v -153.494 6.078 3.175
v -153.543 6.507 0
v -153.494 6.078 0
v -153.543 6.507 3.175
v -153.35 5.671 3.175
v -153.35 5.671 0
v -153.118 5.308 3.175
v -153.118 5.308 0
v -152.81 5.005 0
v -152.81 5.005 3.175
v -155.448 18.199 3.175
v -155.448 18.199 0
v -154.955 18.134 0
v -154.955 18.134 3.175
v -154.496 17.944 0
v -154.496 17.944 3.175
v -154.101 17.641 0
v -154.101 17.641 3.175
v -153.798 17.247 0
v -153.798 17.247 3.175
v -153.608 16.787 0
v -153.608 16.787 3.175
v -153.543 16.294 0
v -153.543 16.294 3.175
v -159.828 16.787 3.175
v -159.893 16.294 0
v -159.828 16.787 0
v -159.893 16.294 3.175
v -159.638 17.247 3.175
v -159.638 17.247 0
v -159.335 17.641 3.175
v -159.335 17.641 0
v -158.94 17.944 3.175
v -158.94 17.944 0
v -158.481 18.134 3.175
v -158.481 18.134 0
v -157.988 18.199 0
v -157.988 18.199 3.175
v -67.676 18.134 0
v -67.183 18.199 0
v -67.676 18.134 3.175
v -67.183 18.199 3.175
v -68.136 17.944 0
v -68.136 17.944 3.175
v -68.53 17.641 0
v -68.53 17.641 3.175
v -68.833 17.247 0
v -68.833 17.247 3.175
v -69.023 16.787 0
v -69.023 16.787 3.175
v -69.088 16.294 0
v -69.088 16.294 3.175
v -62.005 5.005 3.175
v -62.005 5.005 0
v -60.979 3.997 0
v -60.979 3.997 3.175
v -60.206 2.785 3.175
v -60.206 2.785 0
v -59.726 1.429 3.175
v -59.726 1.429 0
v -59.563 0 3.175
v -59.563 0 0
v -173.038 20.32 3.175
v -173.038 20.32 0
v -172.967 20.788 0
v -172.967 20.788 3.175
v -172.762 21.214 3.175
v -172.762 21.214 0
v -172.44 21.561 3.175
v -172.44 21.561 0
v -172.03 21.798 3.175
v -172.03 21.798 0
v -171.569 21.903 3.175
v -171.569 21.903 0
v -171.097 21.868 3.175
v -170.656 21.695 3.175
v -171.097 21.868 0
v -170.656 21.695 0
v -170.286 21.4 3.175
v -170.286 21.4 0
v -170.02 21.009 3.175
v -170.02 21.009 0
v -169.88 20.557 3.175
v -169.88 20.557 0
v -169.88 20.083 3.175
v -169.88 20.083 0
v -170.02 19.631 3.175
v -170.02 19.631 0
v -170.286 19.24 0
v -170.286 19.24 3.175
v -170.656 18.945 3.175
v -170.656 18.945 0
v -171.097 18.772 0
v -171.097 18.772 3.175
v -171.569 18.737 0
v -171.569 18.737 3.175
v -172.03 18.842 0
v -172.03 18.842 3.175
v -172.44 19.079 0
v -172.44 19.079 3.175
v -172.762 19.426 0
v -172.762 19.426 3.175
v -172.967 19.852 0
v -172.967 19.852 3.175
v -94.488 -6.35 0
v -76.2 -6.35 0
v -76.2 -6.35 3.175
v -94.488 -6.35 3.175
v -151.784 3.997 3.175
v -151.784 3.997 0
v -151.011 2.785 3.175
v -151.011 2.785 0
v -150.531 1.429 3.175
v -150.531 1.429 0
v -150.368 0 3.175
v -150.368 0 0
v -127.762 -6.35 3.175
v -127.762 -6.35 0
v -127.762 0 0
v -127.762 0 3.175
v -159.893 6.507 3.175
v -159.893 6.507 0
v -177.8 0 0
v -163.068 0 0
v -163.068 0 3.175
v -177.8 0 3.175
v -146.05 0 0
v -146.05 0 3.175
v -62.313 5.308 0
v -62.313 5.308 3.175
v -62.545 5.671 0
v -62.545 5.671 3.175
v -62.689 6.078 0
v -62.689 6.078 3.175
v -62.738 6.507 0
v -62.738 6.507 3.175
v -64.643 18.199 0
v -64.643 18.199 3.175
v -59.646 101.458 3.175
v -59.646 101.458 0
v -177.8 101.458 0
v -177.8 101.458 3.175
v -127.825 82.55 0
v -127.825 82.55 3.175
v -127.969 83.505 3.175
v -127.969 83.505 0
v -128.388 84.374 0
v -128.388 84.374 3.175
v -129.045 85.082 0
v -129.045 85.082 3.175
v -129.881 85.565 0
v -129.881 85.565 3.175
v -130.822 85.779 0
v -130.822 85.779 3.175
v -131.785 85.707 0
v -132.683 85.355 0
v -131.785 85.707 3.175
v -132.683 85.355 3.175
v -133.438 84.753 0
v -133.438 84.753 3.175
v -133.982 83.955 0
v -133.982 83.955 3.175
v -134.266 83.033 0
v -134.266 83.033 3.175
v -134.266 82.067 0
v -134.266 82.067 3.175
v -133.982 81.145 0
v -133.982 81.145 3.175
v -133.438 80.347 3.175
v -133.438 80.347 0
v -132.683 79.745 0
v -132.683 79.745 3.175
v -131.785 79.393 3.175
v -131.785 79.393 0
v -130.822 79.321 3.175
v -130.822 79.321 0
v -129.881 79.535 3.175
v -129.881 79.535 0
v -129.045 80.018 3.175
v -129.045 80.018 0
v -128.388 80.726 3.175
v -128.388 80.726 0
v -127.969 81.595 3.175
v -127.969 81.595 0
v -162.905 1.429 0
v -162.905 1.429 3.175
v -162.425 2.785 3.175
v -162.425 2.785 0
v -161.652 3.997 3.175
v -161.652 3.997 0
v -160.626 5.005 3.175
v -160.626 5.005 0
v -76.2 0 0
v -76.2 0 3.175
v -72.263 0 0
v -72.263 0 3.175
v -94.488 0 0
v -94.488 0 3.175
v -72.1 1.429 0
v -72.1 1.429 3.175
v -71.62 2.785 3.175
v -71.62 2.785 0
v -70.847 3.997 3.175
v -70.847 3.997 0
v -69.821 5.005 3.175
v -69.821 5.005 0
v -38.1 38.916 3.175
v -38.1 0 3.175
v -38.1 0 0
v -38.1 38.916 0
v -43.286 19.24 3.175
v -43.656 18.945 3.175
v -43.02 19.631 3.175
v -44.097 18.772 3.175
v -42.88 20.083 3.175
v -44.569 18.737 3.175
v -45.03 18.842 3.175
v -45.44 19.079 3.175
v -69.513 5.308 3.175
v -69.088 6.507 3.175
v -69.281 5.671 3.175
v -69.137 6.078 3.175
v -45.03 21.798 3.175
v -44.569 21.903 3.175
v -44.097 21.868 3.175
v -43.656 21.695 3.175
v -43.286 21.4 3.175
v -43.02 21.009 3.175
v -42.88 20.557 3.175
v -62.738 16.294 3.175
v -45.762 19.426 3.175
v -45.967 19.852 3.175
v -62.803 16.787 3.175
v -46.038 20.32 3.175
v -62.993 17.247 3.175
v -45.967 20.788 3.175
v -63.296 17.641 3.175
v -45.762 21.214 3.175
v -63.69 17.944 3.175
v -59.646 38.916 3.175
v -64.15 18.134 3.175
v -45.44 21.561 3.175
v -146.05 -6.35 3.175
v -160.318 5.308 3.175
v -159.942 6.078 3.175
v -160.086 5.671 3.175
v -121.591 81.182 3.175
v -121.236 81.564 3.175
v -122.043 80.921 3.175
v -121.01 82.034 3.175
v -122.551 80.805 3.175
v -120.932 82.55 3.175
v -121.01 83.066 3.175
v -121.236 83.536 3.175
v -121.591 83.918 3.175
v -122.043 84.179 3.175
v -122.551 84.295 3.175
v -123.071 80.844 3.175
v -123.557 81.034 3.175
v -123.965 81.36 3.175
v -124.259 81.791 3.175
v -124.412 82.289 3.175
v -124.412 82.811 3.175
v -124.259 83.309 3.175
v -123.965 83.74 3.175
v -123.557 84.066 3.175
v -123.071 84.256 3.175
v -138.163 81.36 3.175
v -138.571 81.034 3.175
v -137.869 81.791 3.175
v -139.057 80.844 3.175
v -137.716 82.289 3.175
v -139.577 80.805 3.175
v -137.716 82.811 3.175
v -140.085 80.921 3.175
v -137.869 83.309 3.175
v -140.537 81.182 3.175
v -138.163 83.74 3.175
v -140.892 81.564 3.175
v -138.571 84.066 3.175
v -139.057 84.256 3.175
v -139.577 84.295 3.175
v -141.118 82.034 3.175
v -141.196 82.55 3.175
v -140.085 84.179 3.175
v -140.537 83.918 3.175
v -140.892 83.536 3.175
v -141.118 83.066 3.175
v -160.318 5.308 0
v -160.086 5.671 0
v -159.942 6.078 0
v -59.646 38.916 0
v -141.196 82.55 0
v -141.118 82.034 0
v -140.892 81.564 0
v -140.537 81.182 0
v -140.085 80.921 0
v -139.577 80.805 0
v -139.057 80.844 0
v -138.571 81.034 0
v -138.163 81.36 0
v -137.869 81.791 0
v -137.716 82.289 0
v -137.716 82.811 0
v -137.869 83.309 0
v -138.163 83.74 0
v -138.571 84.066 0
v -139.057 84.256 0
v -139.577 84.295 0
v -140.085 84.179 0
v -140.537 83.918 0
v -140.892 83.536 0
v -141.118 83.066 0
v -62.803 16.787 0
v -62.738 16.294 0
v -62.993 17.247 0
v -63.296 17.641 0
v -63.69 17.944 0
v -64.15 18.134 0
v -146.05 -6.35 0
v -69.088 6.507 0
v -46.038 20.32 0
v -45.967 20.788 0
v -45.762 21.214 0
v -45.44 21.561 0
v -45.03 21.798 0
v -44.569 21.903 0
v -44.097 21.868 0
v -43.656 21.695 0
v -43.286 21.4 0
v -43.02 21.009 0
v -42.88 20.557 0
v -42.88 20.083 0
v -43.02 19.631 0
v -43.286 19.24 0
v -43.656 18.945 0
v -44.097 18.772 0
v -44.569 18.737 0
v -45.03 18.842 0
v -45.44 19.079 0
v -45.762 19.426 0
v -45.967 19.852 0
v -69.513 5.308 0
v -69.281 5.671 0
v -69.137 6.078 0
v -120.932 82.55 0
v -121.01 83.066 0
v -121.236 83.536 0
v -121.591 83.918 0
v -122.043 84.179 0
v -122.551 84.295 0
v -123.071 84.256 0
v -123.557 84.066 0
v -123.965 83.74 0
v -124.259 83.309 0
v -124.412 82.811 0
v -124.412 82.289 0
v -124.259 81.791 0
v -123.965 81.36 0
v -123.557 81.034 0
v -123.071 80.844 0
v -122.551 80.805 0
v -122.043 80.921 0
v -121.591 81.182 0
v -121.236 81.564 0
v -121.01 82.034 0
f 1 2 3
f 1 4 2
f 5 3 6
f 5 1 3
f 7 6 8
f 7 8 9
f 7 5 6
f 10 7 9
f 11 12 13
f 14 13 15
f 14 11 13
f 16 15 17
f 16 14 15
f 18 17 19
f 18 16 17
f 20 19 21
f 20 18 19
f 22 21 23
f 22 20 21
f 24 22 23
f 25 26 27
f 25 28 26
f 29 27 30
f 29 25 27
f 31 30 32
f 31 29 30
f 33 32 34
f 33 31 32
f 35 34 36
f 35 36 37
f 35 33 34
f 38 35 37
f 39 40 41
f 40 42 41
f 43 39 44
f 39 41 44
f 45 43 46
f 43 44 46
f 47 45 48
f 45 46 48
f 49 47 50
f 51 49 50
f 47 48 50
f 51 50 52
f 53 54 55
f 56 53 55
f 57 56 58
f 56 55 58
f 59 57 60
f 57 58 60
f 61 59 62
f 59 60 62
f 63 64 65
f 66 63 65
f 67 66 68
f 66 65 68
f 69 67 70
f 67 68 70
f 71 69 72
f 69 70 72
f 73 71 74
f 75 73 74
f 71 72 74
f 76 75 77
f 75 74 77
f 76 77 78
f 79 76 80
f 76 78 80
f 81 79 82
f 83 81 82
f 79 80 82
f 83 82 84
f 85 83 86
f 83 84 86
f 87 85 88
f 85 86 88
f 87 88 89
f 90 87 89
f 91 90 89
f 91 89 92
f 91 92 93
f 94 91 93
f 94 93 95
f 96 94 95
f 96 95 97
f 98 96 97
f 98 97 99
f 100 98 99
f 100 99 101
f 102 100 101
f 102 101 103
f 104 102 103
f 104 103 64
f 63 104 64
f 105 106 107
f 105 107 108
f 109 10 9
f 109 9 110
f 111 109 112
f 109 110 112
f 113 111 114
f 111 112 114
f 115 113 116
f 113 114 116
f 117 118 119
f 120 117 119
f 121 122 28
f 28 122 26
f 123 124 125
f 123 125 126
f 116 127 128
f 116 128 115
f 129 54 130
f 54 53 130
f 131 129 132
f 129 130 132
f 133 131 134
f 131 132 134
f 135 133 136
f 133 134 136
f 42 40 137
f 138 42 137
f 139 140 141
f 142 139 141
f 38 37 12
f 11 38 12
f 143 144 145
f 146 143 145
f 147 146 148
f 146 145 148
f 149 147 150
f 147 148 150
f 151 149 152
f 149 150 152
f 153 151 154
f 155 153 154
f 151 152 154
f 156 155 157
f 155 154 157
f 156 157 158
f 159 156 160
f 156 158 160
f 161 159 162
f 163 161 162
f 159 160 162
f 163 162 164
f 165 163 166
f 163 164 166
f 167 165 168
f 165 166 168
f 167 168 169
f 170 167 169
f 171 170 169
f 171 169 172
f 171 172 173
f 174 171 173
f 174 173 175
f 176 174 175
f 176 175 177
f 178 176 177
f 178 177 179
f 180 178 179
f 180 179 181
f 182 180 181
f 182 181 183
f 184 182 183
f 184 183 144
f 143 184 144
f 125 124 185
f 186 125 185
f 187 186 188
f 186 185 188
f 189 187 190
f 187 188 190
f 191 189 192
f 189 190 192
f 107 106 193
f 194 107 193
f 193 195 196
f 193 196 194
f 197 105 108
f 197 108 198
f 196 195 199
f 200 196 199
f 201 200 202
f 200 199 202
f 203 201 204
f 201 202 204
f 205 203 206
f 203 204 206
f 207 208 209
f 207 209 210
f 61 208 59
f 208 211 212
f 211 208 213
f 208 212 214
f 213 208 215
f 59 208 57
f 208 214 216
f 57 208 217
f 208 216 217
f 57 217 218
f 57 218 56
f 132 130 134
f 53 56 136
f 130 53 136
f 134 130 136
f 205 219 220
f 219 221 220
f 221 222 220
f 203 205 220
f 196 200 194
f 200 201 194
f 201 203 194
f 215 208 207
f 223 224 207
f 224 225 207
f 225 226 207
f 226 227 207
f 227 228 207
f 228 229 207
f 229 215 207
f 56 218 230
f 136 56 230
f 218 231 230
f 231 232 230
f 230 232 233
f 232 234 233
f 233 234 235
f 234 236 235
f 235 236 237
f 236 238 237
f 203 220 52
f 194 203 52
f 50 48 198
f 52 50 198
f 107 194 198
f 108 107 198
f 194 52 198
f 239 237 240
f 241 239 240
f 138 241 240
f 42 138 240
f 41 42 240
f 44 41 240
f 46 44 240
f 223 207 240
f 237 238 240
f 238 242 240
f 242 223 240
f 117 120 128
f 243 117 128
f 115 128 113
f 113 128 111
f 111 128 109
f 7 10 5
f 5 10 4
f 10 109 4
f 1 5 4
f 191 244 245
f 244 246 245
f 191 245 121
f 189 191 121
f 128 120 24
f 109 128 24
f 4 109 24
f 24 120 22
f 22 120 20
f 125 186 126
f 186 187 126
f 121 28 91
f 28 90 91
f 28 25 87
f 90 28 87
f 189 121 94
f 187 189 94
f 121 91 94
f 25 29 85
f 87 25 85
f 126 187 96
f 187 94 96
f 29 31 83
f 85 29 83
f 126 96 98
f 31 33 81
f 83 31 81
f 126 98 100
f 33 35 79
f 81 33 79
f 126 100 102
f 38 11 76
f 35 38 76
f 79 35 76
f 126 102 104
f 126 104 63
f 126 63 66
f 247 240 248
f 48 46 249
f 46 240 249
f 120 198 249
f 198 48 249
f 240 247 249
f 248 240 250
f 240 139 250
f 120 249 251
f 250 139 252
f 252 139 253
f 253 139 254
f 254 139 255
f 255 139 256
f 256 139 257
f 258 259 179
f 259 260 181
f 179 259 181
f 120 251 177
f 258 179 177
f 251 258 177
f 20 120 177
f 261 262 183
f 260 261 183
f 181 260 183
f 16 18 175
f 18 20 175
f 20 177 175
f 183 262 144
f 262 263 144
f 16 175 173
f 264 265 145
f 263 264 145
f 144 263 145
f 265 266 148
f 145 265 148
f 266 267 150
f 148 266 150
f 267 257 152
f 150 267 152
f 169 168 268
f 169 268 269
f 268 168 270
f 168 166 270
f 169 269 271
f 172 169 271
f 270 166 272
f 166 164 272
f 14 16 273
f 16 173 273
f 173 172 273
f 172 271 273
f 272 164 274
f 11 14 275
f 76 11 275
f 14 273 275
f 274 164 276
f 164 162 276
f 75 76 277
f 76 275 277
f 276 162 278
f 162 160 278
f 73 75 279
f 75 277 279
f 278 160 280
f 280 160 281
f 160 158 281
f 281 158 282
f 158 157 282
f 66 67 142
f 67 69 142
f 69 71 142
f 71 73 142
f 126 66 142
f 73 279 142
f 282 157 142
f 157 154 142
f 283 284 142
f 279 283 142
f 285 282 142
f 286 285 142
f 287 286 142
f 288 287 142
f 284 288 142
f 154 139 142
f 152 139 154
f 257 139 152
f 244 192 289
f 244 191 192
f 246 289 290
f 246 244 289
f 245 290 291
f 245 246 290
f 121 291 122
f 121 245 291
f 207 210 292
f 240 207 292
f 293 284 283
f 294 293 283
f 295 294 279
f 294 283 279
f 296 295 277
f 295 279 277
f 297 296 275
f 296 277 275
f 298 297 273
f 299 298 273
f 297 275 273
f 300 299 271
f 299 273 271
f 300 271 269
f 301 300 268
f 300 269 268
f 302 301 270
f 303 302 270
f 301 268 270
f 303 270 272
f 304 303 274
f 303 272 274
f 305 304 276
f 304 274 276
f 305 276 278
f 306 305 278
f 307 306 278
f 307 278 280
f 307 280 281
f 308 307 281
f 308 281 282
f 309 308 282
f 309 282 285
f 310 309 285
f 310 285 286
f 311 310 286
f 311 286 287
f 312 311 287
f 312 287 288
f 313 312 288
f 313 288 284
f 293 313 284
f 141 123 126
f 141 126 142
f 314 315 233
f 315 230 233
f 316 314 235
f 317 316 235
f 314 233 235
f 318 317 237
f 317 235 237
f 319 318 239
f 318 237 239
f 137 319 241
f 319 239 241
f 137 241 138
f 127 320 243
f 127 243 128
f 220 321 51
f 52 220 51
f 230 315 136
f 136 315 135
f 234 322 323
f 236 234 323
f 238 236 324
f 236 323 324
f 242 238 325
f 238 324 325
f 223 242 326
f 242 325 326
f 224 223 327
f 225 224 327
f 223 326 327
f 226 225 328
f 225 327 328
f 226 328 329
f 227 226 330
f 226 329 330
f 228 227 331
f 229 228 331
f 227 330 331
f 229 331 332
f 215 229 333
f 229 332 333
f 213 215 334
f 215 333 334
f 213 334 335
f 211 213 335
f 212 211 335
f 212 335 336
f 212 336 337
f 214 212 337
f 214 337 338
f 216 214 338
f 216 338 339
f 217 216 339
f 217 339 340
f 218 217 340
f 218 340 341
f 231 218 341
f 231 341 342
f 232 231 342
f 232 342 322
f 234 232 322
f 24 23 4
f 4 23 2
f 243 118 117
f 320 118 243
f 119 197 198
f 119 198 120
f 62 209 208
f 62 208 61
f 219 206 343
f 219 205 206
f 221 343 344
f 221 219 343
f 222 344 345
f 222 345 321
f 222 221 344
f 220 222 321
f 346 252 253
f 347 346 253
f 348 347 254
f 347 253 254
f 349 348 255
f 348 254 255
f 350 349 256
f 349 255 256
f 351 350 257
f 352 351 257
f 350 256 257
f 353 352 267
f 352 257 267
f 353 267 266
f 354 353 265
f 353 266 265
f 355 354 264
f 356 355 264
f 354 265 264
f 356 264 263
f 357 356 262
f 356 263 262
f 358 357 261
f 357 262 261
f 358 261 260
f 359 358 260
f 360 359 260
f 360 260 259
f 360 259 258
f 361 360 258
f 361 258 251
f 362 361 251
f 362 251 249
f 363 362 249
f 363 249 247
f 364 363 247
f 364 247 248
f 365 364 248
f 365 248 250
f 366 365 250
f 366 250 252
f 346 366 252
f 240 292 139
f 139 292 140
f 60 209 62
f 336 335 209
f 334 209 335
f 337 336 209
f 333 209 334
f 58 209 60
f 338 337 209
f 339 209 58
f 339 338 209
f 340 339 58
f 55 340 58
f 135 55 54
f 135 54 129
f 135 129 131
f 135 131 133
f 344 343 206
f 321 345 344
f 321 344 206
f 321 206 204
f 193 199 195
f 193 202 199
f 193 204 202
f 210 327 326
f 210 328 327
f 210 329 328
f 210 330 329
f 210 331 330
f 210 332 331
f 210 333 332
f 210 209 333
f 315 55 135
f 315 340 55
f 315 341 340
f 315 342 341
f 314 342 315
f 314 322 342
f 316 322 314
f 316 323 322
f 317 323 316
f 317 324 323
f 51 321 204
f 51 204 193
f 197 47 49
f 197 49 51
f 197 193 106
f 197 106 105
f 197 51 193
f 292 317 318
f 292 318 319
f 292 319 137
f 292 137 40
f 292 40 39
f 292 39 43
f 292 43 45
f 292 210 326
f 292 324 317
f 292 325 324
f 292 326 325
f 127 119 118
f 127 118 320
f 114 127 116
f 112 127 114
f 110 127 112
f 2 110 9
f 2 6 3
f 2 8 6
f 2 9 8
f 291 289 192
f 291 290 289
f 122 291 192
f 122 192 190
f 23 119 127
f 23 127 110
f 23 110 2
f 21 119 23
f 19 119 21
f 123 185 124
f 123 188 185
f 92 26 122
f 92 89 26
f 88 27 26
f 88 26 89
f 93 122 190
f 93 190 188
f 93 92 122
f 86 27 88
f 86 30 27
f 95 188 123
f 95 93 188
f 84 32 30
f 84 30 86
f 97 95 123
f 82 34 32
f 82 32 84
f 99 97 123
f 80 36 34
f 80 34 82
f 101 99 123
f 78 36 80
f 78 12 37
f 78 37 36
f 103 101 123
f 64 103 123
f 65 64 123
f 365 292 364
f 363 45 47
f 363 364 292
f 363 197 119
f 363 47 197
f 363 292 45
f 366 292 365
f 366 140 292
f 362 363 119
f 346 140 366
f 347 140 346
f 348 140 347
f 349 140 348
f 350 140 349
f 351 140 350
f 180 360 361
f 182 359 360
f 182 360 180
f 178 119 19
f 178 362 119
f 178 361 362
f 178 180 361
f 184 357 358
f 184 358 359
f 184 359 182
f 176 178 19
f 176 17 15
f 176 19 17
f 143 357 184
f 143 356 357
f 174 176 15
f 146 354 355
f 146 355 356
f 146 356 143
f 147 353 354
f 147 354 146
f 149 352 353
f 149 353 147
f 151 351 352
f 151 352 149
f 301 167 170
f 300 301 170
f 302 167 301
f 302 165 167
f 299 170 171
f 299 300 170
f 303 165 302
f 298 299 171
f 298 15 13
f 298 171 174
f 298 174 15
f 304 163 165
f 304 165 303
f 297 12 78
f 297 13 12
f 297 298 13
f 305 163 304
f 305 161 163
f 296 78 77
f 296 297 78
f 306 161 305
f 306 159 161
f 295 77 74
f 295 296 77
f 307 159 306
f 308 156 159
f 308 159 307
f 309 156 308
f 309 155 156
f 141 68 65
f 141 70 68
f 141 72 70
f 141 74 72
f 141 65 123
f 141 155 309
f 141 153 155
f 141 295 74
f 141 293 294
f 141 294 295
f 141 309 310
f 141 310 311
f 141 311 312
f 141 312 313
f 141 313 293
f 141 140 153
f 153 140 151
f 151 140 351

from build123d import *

# Parameters (mm, degrees)
BOSS_EXTRUDE1_DEPTH = 3.175
SKETCH2_R           = 1.5875
CUT_EXTRUDE1_DEPTH  = 3.175
BOSS_EXTRUDE2_DEPTH = 3.175
CUT_EXTRUDE2_DEPTH  = 3.175
SKETCH5_W           = 1.5875
SKETCH5_H           = 12.7
CUT_EXTRUDE3_DEPTH  = 10.16
LPATTERN1_COUNT     = 2
LPATTERN1_PITCH     = 25.4
SKETCH8_W           = 38.1
SKETCH8_H           = 46.355
CUT_EXTRUDE6_DEPTH  = 12.7
SKETCH10_R          = 1.5875
CUT_EXTRUDE7_DEPTH  = 7.62
CUT_EXTRUDE8_DEPTH  = 12.7
FILLET1_R           = 25.4
SKETCH13_W          = 25.4
SKETCH13_H          = 177.8
BOSS_EXTRUDE3_DEPTH = 3.175
LPATTERN2_COUNT     = 2
LPATTERN2_PITCH     = 76.2
SKETCH14_W          = 19.05
SKETCH14_H          = 6.35
BOSS_EXTRUDE4_DEPTH = 3.175
FILLET2_R           = 1.905
CUT_EXTRUDE9_DEPTH  = 392.916423648
SKETCH16_R          = 3.2385
CUT_EXTRUDE10_DEPTH = 205.735785414
SKETCH17_R          = 1.75
CUT_EXTRUDE11_DEPTH = 205.735785414
SKETCH18_W          = 33.274
SKETCH18_H          = 6.35
CUT_EXTRUDE12_DEPTH = 205.735785414


with BuildPart() as part:
    # Sketch1 → Boss-Extrude1 (new body)
    with BuildSketch(Plane.XY):
        Polygon((0, 0), (-177.8, 0), (-177.8, 349.25), (-25.4, 349.25), align=None)
    extrude(amount=BOSS_EXTRUDE1_DEPTH)

    # Sketch2 → Cut-Extrude1 (cut)
    with BuildSketch(Plane.XY.offset(3.175)):
        with Locations((-127, 133.35)):
            Circle(SKETCH2_R)
        with Locations((-127, 306.07)):
            Circle(SKETCH2_R)
    extrude(amount=-CUT_EXTRUDE1_DEPTH, mode=Mode.SUBTRACT)

    # Sketch3 → Boss-Extrude2 (add)
    with BuildSketch(Plane.XY.offset(3.175)):
        Polygon((-63.5, 88.9), (63.5, 111.29352655), (63.5, 187.49352655), (-63.5, 187.49352655), align=None)
    extrude(amount=-BOSS_EXTRUDE2_DEPTH)

    # Sketch4 → Cut-Extrude2 (cut)
    with BuildSketch(Plane.XY.offset(3.175)):
        Polygon((-44.45, 110.49), (-31.942941537, 112.695331856), (-32.494274501, 115.822096472), (-45.001332964, 113.616764616), align=None)
        Polygon((-6.92882461, 117.105995569), (5.578233853, 119.311327425), (5.026900889, 122.438092041), (-7.480157574, 120.232760185), align=None)
    cut_extrude2 = extrude(amount=-CUT_EXTRUDE2_DEPTH, mode=Mode.SUBTRACT)

    # Sketch5 → Cut-Extrude3 (cut)
    with BuildSketch(Plane.XY.offset(3.175)):
        with Locations((-126.20625, 209.55)):
            Rectangle(SKETCH5_W, SKETCH5_H)
        with Locations((-127.79375, 209.55)):
            Rectangle(SKETCH5_W, SKETCH5_H)
    cut_extrude3 = extrude(amount=-CUT_EXTRUDE3_DEPTH, mode=Mode.SUBTRACT)

    # LPattern1: Cut-Extrude3 ×2
    with Locations(*[(0, i * LPATTERN1_PITCH, 0) for i in range(1, LPATTERN1_COUNT)]):
        add(cut_extrude3, mode=Mode.SUBTRACT)

    # Sketch8 → Cut-Extrude6 (cut)
    with BuildSketch(Plane.XY.offset(3.175)):
        with Locations((-19.05, 23.1775)):
            Rectangle(SKETCH8_W, SKETCH8_H)
    extrude(amount=-CUT_EXTRUDE6_DEPTH, mode=Mode.SUBTRACT)

    # Sketch10 → Cut-Extrude7 (cut)
    with BuildSketch(Plane(origin=(0, 0, 0), x_dir=(-1, 0, 0), z_dir=(0, 0, -1))):
        with Locations((171.45, 20.32)):
            Circle(SKETCH10_R)
        with Locations((44.45, 20.32)):
            Circle(SKETCH10_R)
    extrude(amount=-CUT_EXTRUDE7_DEPTH, mode=Mode.SUBTRACT)

    # Sketch11 → Cut-Extrude8 (cut)
    with BuildSketch(Plane(origin=(0, 0, 0), x_dir=(-1, 0, 0), z_dir=(0, 0, -1))):
        with BuildLine():
            Line((62.738, 18.199261314), (62.738, 5.499261314))
            ThreePointArc((62.738, 5.499261314), (65.913, 6.35), (69.088, 5.499261314))
            Line((69.088, 5.499261314), (69.088, 18.199261314))
            Line((69.088, 18.199261314), (62.738, 18.199261314))
        make_face()
        with BuildLine():
            Line((69.088, 5.499261314), (62.738, 5.499261314))
            ThreePointArc((62.738, 5.499261314), (60.413738686, 3.175), (59.563, 0))
            Line((59.563, 0), (72.263, 0))
            ThreePointArc((72.263, 0), (71.412261314, 3.175), (69.088, 5.499261314))
        make_face()
        with BuildLine():
            ThreePointArc((153.543, 5.499261314), (151.218738686, 3.175), (150.368, 0))
            Line((150.368, 0), (163.068, 0))
            ThreePointArc((163.068, 0), (162.217261314, 3.175), (159.893, 5.499261314))
            Line((159.893, 5.499261314), (153.543, 5.499261314))
        make_face()
        with BuildLine():
            Line((153.543, 18.199261314), (153.543, 5.499261314))
            ThreePointArc((153.543, 5.499261314), (156.718, 6.35), (159.893, 5.499261314))
            Line((159.893, 5.499261314), (159.893, 18.199261314))
            Line((159.893, 18.199261314), (153.543, 18.199261314))
        make_face()
        with BuildLine():
            ThreePointArc((159.893, 5.499261314), (156.718, 6.35), (153.543, 5.499261314))
            Line((153.543, 5.499261314), (159.893, 5.499261314))
        make_face()
    extrude(amount=-CUT_EXTRUDE8_DEPTH, mode=Mode.SUBTRACT)


with BuildPart() as cut_extrude8_kept_piece:
    # of the separate pieces the step leaves, the one the design keeps (cut_extrude8_pieces_kept)
    add(part.part.solids().sort_by_distance((-38.1, 0, 0))[0])

    # Fillet1
    fillet1_edges = [cut_extrude8_kept_piece.edges().sort_by_distance(p)[0] for p in [
        (-38.1, 46.355, 1.5875),
    ]]
    fillet(fillet1_edges, radius=FILLET1_R)

    # Sketch13 → Boss-Extrude3 (add)
    with BuildSketch(Plane(origin=(0, 0, 0), x_dir=(-1, 0, 0), z_dir=(0, 0, -1))):
        with Locations((12.7, 260.35)):
            Rectangle(SKETCH13_W, SKETCH13_H)
    extrude(amount=-BOSS_EXTRUDE3_DEPTH)

    # LPattern2: Cut-Extrude2 ×2
    with Locations(*[Vector(0.9848077530122078, 0.17364817766693205, 0) * (i * LPATTERN2_PITCH) for i in range(1, LPATTERN2_COUNT)]):
        add(cut_extrude2, mode=Mode.SUBTRACT)

    # Sketch14 → Boss-Extrude4 (add)
    with BuildSketch(Plane(origin=(0, 0, 0), x_dir=(-1, 0, 0), z_dir=(0, 0, -1))):
        with Locations((85.725, -3.175)):
            Rectangle(SKETCH14_W, SKETCH14_H)
        with Locations((136.525, -3.175)):
            Rectangle(SKETCH14_W, SKETCH14_H)
    extrude(amount=-BOSS_EXTRUDE4_DEPTH)

    # Fillet2
    fillet2_edges = [cut_extrude8_kept_piece.edges().sort_by_distance(p)[0] for p in [
        (-153.543, 5.499261314, 1.5875),
        (-153.543, 18.199261314, 1.5875),
        (-159.893, 18.199261314, 1.5875),
        (-159.893, 5.499261314, 1.5875),
        (-62.738, 5.499261314, 1.5875),
        (-62.738, 18.199261314, 1.5875),
        (-69.088, 18.199261314, 1.5875),
        (-69.088, 5.499261314, 1.5875),
    ]]
    fillet(fillet2_edges, radius=FILLET2_R)

    # Sketch15 → Cut-Extrude9 (cut, through all)
    with BuildSketch(Plane(origin=(0, 0, 0), x_dir=(-1, 0, 0), z_dir=(0, 0, -1))):
        Polygon((38.1, 20.955), (38.1, 38.915512242), (59.646092876, 38.915512242), (59.646092876, 87.95072106), (59.646092876, 101.458470342), (177.8, 101.458470342), (320.979610432, 349.25), (0, 416.848504921), (-115.466676424, 312.716348385), (-102.18599125, 94.704595701), align=None)
    extrude(amount=-CUT_EXTRUDE9_DEPTH, mode=Mode.SUBTRACT)

    # Sketch16 → Cut-Extrude10 (cut, through all)
    with BuildSketch(Plane.XY.offset(3.175)):
        with Locations((-131.064, 82.55)):
            Circle(SKETCH16_R)
    extrude(amount=-CUT_EXTRUDE10_DEPTH, mode=Mode.SUBTRACT)

    # Sketch17 → Cut-Extrude11 (cut, through all)
    with BuildSketch(Plane.XY.offset(3.175)):
        with Locations((-122.682, 82.55)):
            Circle(SKETCH17_R)
        with Locations(Location((-139.446, 82.55, 0), (0, 0, 180))):
            Circle(SKETCH17_R)
    extrude(amount=-CUT_EXTRUDE11_DEPTH, mode=Mode.SUBTRACT)

    # Sketch18 → Cut-Extrude12 (cut, through all)
    with BuildSketch(Plane(origin=(0, 0, 0), x_dir=(-1, 0, 0), z_dir=(0, 0, -1))):
        with Locations((111.125, -3.175)):
            Rectangle(SKETCH18_W, SKETCH18_H)
    extrude(amount=-CUT_EXTRUDE12_DEPTH, mode=Mode.SUBTRACT)


solid = cut_extrude8_kept_piece.part
